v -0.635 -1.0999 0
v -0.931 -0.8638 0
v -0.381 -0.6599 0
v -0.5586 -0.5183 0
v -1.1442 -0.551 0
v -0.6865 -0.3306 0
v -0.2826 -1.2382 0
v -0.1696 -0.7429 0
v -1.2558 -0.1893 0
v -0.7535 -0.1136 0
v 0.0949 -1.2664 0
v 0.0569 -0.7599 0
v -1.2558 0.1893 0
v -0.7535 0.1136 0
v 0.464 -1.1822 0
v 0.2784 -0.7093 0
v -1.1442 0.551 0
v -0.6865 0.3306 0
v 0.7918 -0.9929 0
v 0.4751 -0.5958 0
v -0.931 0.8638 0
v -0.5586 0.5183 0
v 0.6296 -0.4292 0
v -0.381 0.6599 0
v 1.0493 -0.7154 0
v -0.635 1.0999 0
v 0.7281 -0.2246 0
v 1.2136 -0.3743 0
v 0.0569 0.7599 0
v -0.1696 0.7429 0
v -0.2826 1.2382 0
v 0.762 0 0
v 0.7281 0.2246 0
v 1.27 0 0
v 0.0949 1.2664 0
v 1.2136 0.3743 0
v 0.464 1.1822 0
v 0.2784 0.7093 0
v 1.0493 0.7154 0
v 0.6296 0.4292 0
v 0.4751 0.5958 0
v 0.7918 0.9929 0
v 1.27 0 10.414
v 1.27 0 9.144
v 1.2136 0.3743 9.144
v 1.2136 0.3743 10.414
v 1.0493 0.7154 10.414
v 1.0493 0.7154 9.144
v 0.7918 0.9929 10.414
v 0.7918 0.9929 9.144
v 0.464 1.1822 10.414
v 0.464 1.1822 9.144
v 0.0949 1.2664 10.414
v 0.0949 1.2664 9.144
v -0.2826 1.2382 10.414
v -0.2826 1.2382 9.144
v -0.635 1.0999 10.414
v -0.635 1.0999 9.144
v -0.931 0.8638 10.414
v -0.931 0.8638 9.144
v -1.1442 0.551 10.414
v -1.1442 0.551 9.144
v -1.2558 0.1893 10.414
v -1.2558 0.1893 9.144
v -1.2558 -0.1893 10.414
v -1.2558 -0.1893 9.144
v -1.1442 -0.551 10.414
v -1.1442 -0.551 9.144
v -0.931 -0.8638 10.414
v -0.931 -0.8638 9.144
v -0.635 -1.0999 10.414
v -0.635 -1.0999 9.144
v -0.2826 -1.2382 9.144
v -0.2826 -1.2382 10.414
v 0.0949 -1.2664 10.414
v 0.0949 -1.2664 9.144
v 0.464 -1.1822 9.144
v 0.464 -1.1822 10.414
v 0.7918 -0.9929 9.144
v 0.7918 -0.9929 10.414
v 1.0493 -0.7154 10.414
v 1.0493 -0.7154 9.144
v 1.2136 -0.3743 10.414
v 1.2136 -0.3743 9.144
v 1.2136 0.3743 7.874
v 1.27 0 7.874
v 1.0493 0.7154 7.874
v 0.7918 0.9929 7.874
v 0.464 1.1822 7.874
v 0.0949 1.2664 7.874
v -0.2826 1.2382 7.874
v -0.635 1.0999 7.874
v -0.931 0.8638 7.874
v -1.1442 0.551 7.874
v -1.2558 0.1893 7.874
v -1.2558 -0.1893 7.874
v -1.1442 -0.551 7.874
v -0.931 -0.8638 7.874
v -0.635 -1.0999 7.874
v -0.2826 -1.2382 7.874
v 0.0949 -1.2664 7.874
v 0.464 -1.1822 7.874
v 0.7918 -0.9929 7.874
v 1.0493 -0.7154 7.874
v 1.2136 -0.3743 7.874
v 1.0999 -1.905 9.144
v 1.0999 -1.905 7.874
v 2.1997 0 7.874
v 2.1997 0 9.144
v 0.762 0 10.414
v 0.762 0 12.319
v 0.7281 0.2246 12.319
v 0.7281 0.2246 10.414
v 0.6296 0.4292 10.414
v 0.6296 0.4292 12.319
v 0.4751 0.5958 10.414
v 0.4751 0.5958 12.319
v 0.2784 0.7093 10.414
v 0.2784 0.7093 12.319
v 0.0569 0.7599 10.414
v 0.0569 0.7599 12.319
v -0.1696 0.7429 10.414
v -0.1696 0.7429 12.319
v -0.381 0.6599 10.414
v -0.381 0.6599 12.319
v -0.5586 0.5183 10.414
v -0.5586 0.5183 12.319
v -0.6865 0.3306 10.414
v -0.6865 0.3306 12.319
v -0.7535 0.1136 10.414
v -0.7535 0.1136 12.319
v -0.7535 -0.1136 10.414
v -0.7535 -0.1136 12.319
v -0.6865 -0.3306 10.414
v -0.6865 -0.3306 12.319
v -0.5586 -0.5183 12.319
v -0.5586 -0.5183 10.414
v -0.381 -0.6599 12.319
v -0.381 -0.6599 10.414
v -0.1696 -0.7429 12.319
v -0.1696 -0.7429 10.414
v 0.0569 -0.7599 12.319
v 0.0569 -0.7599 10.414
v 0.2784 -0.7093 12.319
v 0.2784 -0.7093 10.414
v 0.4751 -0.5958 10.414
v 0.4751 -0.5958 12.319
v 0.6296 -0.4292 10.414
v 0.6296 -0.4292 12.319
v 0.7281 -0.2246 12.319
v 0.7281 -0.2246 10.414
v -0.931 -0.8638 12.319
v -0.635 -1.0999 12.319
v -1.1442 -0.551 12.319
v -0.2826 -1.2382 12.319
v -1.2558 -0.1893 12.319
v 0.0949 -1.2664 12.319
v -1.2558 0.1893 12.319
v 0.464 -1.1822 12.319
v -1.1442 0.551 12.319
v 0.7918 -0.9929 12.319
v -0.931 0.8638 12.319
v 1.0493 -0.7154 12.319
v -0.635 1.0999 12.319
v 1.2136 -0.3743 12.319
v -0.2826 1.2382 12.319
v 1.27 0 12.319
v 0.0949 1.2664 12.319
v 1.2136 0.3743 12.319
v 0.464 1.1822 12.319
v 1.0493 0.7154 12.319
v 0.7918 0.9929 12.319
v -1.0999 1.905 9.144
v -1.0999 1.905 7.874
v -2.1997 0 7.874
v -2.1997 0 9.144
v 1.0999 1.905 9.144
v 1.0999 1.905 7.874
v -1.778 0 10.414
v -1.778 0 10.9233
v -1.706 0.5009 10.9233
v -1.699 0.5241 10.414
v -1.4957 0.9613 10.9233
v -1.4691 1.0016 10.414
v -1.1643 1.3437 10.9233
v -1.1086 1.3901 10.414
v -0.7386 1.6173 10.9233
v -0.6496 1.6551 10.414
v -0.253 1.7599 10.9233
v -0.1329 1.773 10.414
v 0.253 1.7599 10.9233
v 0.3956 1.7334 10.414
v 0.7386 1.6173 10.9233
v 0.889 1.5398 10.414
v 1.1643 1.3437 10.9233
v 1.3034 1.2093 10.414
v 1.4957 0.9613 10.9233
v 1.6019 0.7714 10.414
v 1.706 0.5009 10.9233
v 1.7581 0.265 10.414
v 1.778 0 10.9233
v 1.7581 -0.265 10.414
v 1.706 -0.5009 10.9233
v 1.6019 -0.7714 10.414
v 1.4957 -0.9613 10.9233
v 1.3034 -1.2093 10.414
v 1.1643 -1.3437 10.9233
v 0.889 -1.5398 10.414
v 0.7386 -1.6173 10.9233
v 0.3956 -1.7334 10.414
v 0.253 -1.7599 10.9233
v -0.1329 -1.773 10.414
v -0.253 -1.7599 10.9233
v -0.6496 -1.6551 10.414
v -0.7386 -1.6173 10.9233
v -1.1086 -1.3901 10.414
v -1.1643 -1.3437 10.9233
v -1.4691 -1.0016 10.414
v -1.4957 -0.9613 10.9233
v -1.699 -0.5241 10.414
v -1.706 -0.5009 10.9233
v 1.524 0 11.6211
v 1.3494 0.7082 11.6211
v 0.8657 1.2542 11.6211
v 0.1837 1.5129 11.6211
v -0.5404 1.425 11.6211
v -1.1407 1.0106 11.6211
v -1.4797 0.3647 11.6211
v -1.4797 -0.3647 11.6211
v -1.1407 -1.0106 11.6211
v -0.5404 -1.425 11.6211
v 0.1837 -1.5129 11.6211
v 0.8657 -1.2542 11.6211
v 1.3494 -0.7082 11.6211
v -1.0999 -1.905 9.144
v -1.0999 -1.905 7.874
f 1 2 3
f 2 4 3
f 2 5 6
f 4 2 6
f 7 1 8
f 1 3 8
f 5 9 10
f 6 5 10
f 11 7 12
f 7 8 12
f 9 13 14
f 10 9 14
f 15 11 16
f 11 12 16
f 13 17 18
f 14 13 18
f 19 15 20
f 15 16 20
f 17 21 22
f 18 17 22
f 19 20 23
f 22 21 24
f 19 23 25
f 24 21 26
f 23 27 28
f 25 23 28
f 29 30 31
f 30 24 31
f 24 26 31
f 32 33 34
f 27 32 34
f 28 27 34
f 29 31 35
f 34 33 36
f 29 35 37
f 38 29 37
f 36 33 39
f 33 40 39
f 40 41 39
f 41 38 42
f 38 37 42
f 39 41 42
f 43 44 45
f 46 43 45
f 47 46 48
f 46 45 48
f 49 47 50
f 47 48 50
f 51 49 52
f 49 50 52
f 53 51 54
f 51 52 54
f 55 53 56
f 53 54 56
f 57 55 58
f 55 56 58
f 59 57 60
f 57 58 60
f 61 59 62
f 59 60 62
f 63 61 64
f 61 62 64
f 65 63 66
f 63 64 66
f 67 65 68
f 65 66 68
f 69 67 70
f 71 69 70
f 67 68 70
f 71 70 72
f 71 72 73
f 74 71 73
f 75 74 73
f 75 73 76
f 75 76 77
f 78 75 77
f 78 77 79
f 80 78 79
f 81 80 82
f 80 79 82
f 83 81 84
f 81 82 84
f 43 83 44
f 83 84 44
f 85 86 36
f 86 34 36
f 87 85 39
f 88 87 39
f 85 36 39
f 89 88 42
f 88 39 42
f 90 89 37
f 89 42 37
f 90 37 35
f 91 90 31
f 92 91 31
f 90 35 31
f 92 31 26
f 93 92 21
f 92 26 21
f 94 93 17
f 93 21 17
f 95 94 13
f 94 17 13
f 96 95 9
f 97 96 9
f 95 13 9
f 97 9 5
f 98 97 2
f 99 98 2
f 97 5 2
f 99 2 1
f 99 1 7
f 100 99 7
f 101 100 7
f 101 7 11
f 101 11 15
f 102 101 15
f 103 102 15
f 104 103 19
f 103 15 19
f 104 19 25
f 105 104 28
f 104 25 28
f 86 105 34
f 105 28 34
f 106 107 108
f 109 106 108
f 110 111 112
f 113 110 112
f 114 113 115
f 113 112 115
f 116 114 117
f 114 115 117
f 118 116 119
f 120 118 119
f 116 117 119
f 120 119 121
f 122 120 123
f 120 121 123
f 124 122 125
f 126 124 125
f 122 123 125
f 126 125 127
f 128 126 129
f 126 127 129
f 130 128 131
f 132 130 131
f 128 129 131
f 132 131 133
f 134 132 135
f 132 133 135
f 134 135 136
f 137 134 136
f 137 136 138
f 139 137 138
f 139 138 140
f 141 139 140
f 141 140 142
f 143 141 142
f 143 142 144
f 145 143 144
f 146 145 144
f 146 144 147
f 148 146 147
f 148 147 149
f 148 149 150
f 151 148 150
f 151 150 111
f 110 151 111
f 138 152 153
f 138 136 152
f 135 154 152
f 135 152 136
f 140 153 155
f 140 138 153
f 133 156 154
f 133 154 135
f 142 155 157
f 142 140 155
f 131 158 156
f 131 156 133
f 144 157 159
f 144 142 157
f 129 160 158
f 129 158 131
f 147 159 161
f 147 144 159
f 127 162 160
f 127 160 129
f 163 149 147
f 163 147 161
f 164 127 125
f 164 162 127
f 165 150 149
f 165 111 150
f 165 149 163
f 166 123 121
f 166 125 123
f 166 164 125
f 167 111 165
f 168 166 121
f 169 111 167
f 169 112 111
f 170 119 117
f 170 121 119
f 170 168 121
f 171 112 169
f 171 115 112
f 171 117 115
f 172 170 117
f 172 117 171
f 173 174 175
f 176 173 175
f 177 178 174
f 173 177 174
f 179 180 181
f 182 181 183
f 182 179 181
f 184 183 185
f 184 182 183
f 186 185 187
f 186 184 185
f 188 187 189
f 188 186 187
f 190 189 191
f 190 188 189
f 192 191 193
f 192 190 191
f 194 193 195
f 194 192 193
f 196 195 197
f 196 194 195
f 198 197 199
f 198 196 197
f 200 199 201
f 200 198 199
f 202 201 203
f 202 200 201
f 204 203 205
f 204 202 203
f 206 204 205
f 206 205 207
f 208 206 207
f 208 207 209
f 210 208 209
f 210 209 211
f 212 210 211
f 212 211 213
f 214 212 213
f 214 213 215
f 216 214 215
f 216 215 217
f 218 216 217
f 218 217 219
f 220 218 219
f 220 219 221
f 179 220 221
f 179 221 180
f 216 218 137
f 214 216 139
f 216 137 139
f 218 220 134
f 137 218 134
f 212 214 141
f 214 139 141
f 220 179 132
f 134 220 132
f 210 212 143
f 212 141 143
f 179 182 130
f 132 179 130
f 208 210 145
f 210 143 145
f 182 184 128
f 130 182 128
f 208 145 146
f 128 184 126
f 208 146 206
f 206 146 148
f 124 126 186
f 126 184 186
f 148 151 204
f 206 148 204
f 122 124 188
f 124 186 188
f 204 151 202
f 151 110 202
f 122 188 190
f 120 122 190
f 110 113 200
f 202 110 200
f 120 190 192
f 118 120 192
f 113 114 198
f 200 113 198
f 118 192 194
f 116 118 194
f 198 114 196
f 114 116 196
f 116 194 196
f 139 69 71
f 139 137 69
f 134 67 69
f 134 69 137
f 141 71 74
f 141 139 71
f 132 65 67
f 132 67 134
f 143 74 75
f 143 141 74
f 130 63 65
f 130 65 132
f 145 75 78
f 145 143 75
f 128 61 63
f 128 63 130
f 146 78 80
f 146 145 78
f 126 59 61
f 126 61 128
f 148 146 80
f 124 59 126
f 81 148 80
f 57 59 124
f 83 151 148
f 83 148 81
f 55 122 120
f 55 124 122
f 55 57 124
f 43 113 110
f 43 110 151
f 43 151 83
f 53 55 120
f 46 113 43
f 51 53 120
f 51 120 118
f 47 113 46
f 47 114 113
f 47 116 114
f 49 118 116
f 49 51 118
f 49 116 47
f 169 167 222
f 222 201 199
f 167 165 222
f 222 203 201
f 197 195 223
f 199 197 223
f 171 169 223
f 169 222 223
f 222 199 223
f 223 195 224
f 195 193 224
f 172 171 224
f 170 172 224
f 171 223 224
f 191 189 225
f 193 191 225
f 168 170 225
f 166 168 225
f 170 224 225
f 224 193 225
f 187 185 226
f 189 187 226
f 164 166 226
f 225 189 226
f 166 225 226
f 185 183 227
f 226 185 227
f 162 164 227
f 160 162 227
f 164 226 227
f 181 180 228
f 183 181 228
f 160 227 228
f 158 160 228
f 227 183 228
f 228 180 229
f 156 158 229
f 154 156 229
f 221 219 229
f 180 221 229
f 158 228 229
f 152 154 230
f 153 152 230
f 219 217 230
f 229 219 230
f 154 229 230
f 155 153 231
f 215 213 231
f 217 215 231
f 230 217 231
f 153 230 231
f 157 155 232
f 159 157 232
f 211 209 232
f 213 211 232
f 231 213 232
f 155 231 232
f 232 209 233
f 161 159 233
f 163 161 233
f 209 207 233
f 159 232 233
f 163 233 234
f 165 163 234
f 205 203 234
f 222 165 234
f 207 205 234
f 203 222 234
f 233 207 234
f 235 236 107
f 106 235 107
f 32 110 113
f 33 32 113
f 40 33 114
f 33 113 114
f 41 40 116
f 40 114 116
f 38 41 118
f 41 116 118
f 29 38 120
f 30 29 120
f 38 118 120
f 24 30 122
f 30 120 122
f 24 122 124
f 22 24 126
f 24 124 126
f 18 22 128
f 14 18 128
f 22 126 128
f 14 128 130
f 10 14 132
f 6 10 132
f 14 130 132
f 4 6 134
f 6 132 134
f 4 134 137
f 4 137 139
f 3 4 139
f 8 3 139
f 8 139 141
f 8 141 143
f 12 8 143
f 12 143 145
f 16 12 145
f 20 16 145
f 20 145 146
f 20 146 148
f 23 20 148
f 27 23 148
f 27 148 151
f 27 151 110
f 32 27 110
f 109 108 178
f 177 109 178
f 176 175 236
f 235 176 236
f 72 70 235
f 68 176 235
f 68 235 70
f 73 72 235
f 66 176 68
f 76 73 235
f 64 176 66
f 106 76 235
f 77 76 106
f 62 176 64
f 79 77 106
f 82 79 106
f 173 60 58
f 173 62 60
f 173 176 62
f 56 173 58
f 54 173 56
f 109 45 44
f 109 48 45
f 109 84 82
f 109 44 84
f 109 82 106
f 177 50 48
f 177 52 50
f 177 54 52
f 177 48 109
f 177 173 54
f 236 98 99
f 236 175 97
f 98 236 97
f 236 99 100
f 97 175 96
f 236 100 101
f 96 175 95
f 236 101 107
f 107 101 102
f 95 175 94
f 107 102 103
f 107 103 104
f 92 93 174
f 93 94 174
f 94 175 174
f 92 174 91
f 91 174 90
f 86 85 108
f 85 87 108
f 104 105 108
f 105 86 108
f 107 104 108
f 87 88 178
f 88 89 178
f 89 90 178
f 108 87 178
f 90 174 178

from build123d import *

# Parameters (mm, degrees)
SKETCH1_R           = 1.27
BOSS_EXTRUDE1_DEPTH = 6.35
SKETCH2_R           = 1.27
BOSS_EXTRUDE2_DEPTH = 0.254
SKETCH3_R           = 1.27
BOSS_EXTRUDE3_DEPTH = 1.27
BOSS_EXTRUDE4_DEPTH = 1.27
SKETCH5_R           = 1.27
BOSS_EXTRUDE5_DEPTH = 1.27
SKETCH6_R           = 1.27
BOSS_EXTRUDE6_DEPTH = 1.905
DRAFT3_ANGLE        = 20
SKETCH7_R           = 0.762
CUT_EXTRUDE1_DEPTH  = 13.319
SKETCH8_R           = 1.963363296
SKETCH8_R_2         = 1.778
CUT_EXTRUDE2_DEPTH  = 2.54


with BuildPart() as part:
    # Sketch1 → Boss-Extrude1 (new body)
    with BuildSketch(Plane.XY):
        Circle(SKETCH1_R)
    extrude(amount=BOSS_EXTRUDE1_DEPTH)

    # Sketch2 → Boss-Extrude2 (add)
    with BuildSketch(Plane.XY.offset(6.35)):
        Circle(SKETCH2_R)
    extrude(amount=BOSS_EXTRUDE2_DEPTH)

    # Sketch3 → Boss-Extrude3 (add)
    with BuildSketch(Plane.XY.offset(6.604)):
        Circle(SKETCH3_R)
    extrude(amount=BOSS_EXTRUDE3_DEPTH)

    # Sketch4 → Boss-Extrude4 (add)
    with BuildSketch(Plane.XY.offset(7.874)):
        Polygon((2.199704526, 0), (1.099852263, 1.905), (-1.099852263, 1.905), (-2.199704526, 0), (-1.099852263, -1.905), (1.099852263, -1.905), align=None)
    extrude(amount=BOSS_EXTRUDE4_DEPTH)

    # Sketch5 → Boss-Extrude5 (add)
    with BuildSketch(Plane.XY.offset(9.144)):
        Circle(SKETCH5_R)
    extrude(amount=BOSS_EXTRUDE5_DEPTH)


with BuildPart() as body_2:
    # Sketch6 → Boss-Extrude6 (new body)
    with BuildSketch(Plane.XY.offset(10.414)):
        Circle(SKETCH6_R)
    extrude(amount=BOSS_EXTRUDE6_DEPTH)

    # Draft3
    draft3_faces = [body_2.faces().sort_by_distance(p)[0] for p in [
        (-1.27, 0, 11.3665),
    ]]
    draft(draft3_faces, Plane.XY.offset(12.319), DRAFT3_ANGLE)


with BuildPart() as cut_extrude1_tool:
    # Sketch7 → Cut-Extrude1 (new body, through all)
    with BuildSketch(Plane.XY.offset(12.319)):
        Circle(SKETCH7_R)
    extrude(amount=-CUT_EXTRUDE1_DEPTH)


with BuildPart() as part_1:
    add(part.part)

    # Cut-Extrude1: cut by cut_extrude1_tool
    add(cut_extrude1_tool.part, mode=Mode.SUBTRACT)


with BuildPart() as body_2_1:
    add(body_2.part)

    # Cut-Extrude1: cut by cut_extrude1_tool
    add(cut_extrude1_tool.part, mode=Mode.SUBTRACT)

    # Sketch8 → Cut-Extrude2 (cut)
    with BuildSketch(Plane(origin=(0, 0, 10.414), x_dir=(-1, 0, 0), z_dir=(0, 0, -1))):
        Circle(SKETCH8_R)
        Circle(SKETCH8_R_2, mode=Mode.SUBTRACT)
    extrude(amount=-CUT_EXTRUDE2_DEPTH, mode=Mode.SUBTRACT)


solid = Compound([part_1.part, body_2_1.part])
